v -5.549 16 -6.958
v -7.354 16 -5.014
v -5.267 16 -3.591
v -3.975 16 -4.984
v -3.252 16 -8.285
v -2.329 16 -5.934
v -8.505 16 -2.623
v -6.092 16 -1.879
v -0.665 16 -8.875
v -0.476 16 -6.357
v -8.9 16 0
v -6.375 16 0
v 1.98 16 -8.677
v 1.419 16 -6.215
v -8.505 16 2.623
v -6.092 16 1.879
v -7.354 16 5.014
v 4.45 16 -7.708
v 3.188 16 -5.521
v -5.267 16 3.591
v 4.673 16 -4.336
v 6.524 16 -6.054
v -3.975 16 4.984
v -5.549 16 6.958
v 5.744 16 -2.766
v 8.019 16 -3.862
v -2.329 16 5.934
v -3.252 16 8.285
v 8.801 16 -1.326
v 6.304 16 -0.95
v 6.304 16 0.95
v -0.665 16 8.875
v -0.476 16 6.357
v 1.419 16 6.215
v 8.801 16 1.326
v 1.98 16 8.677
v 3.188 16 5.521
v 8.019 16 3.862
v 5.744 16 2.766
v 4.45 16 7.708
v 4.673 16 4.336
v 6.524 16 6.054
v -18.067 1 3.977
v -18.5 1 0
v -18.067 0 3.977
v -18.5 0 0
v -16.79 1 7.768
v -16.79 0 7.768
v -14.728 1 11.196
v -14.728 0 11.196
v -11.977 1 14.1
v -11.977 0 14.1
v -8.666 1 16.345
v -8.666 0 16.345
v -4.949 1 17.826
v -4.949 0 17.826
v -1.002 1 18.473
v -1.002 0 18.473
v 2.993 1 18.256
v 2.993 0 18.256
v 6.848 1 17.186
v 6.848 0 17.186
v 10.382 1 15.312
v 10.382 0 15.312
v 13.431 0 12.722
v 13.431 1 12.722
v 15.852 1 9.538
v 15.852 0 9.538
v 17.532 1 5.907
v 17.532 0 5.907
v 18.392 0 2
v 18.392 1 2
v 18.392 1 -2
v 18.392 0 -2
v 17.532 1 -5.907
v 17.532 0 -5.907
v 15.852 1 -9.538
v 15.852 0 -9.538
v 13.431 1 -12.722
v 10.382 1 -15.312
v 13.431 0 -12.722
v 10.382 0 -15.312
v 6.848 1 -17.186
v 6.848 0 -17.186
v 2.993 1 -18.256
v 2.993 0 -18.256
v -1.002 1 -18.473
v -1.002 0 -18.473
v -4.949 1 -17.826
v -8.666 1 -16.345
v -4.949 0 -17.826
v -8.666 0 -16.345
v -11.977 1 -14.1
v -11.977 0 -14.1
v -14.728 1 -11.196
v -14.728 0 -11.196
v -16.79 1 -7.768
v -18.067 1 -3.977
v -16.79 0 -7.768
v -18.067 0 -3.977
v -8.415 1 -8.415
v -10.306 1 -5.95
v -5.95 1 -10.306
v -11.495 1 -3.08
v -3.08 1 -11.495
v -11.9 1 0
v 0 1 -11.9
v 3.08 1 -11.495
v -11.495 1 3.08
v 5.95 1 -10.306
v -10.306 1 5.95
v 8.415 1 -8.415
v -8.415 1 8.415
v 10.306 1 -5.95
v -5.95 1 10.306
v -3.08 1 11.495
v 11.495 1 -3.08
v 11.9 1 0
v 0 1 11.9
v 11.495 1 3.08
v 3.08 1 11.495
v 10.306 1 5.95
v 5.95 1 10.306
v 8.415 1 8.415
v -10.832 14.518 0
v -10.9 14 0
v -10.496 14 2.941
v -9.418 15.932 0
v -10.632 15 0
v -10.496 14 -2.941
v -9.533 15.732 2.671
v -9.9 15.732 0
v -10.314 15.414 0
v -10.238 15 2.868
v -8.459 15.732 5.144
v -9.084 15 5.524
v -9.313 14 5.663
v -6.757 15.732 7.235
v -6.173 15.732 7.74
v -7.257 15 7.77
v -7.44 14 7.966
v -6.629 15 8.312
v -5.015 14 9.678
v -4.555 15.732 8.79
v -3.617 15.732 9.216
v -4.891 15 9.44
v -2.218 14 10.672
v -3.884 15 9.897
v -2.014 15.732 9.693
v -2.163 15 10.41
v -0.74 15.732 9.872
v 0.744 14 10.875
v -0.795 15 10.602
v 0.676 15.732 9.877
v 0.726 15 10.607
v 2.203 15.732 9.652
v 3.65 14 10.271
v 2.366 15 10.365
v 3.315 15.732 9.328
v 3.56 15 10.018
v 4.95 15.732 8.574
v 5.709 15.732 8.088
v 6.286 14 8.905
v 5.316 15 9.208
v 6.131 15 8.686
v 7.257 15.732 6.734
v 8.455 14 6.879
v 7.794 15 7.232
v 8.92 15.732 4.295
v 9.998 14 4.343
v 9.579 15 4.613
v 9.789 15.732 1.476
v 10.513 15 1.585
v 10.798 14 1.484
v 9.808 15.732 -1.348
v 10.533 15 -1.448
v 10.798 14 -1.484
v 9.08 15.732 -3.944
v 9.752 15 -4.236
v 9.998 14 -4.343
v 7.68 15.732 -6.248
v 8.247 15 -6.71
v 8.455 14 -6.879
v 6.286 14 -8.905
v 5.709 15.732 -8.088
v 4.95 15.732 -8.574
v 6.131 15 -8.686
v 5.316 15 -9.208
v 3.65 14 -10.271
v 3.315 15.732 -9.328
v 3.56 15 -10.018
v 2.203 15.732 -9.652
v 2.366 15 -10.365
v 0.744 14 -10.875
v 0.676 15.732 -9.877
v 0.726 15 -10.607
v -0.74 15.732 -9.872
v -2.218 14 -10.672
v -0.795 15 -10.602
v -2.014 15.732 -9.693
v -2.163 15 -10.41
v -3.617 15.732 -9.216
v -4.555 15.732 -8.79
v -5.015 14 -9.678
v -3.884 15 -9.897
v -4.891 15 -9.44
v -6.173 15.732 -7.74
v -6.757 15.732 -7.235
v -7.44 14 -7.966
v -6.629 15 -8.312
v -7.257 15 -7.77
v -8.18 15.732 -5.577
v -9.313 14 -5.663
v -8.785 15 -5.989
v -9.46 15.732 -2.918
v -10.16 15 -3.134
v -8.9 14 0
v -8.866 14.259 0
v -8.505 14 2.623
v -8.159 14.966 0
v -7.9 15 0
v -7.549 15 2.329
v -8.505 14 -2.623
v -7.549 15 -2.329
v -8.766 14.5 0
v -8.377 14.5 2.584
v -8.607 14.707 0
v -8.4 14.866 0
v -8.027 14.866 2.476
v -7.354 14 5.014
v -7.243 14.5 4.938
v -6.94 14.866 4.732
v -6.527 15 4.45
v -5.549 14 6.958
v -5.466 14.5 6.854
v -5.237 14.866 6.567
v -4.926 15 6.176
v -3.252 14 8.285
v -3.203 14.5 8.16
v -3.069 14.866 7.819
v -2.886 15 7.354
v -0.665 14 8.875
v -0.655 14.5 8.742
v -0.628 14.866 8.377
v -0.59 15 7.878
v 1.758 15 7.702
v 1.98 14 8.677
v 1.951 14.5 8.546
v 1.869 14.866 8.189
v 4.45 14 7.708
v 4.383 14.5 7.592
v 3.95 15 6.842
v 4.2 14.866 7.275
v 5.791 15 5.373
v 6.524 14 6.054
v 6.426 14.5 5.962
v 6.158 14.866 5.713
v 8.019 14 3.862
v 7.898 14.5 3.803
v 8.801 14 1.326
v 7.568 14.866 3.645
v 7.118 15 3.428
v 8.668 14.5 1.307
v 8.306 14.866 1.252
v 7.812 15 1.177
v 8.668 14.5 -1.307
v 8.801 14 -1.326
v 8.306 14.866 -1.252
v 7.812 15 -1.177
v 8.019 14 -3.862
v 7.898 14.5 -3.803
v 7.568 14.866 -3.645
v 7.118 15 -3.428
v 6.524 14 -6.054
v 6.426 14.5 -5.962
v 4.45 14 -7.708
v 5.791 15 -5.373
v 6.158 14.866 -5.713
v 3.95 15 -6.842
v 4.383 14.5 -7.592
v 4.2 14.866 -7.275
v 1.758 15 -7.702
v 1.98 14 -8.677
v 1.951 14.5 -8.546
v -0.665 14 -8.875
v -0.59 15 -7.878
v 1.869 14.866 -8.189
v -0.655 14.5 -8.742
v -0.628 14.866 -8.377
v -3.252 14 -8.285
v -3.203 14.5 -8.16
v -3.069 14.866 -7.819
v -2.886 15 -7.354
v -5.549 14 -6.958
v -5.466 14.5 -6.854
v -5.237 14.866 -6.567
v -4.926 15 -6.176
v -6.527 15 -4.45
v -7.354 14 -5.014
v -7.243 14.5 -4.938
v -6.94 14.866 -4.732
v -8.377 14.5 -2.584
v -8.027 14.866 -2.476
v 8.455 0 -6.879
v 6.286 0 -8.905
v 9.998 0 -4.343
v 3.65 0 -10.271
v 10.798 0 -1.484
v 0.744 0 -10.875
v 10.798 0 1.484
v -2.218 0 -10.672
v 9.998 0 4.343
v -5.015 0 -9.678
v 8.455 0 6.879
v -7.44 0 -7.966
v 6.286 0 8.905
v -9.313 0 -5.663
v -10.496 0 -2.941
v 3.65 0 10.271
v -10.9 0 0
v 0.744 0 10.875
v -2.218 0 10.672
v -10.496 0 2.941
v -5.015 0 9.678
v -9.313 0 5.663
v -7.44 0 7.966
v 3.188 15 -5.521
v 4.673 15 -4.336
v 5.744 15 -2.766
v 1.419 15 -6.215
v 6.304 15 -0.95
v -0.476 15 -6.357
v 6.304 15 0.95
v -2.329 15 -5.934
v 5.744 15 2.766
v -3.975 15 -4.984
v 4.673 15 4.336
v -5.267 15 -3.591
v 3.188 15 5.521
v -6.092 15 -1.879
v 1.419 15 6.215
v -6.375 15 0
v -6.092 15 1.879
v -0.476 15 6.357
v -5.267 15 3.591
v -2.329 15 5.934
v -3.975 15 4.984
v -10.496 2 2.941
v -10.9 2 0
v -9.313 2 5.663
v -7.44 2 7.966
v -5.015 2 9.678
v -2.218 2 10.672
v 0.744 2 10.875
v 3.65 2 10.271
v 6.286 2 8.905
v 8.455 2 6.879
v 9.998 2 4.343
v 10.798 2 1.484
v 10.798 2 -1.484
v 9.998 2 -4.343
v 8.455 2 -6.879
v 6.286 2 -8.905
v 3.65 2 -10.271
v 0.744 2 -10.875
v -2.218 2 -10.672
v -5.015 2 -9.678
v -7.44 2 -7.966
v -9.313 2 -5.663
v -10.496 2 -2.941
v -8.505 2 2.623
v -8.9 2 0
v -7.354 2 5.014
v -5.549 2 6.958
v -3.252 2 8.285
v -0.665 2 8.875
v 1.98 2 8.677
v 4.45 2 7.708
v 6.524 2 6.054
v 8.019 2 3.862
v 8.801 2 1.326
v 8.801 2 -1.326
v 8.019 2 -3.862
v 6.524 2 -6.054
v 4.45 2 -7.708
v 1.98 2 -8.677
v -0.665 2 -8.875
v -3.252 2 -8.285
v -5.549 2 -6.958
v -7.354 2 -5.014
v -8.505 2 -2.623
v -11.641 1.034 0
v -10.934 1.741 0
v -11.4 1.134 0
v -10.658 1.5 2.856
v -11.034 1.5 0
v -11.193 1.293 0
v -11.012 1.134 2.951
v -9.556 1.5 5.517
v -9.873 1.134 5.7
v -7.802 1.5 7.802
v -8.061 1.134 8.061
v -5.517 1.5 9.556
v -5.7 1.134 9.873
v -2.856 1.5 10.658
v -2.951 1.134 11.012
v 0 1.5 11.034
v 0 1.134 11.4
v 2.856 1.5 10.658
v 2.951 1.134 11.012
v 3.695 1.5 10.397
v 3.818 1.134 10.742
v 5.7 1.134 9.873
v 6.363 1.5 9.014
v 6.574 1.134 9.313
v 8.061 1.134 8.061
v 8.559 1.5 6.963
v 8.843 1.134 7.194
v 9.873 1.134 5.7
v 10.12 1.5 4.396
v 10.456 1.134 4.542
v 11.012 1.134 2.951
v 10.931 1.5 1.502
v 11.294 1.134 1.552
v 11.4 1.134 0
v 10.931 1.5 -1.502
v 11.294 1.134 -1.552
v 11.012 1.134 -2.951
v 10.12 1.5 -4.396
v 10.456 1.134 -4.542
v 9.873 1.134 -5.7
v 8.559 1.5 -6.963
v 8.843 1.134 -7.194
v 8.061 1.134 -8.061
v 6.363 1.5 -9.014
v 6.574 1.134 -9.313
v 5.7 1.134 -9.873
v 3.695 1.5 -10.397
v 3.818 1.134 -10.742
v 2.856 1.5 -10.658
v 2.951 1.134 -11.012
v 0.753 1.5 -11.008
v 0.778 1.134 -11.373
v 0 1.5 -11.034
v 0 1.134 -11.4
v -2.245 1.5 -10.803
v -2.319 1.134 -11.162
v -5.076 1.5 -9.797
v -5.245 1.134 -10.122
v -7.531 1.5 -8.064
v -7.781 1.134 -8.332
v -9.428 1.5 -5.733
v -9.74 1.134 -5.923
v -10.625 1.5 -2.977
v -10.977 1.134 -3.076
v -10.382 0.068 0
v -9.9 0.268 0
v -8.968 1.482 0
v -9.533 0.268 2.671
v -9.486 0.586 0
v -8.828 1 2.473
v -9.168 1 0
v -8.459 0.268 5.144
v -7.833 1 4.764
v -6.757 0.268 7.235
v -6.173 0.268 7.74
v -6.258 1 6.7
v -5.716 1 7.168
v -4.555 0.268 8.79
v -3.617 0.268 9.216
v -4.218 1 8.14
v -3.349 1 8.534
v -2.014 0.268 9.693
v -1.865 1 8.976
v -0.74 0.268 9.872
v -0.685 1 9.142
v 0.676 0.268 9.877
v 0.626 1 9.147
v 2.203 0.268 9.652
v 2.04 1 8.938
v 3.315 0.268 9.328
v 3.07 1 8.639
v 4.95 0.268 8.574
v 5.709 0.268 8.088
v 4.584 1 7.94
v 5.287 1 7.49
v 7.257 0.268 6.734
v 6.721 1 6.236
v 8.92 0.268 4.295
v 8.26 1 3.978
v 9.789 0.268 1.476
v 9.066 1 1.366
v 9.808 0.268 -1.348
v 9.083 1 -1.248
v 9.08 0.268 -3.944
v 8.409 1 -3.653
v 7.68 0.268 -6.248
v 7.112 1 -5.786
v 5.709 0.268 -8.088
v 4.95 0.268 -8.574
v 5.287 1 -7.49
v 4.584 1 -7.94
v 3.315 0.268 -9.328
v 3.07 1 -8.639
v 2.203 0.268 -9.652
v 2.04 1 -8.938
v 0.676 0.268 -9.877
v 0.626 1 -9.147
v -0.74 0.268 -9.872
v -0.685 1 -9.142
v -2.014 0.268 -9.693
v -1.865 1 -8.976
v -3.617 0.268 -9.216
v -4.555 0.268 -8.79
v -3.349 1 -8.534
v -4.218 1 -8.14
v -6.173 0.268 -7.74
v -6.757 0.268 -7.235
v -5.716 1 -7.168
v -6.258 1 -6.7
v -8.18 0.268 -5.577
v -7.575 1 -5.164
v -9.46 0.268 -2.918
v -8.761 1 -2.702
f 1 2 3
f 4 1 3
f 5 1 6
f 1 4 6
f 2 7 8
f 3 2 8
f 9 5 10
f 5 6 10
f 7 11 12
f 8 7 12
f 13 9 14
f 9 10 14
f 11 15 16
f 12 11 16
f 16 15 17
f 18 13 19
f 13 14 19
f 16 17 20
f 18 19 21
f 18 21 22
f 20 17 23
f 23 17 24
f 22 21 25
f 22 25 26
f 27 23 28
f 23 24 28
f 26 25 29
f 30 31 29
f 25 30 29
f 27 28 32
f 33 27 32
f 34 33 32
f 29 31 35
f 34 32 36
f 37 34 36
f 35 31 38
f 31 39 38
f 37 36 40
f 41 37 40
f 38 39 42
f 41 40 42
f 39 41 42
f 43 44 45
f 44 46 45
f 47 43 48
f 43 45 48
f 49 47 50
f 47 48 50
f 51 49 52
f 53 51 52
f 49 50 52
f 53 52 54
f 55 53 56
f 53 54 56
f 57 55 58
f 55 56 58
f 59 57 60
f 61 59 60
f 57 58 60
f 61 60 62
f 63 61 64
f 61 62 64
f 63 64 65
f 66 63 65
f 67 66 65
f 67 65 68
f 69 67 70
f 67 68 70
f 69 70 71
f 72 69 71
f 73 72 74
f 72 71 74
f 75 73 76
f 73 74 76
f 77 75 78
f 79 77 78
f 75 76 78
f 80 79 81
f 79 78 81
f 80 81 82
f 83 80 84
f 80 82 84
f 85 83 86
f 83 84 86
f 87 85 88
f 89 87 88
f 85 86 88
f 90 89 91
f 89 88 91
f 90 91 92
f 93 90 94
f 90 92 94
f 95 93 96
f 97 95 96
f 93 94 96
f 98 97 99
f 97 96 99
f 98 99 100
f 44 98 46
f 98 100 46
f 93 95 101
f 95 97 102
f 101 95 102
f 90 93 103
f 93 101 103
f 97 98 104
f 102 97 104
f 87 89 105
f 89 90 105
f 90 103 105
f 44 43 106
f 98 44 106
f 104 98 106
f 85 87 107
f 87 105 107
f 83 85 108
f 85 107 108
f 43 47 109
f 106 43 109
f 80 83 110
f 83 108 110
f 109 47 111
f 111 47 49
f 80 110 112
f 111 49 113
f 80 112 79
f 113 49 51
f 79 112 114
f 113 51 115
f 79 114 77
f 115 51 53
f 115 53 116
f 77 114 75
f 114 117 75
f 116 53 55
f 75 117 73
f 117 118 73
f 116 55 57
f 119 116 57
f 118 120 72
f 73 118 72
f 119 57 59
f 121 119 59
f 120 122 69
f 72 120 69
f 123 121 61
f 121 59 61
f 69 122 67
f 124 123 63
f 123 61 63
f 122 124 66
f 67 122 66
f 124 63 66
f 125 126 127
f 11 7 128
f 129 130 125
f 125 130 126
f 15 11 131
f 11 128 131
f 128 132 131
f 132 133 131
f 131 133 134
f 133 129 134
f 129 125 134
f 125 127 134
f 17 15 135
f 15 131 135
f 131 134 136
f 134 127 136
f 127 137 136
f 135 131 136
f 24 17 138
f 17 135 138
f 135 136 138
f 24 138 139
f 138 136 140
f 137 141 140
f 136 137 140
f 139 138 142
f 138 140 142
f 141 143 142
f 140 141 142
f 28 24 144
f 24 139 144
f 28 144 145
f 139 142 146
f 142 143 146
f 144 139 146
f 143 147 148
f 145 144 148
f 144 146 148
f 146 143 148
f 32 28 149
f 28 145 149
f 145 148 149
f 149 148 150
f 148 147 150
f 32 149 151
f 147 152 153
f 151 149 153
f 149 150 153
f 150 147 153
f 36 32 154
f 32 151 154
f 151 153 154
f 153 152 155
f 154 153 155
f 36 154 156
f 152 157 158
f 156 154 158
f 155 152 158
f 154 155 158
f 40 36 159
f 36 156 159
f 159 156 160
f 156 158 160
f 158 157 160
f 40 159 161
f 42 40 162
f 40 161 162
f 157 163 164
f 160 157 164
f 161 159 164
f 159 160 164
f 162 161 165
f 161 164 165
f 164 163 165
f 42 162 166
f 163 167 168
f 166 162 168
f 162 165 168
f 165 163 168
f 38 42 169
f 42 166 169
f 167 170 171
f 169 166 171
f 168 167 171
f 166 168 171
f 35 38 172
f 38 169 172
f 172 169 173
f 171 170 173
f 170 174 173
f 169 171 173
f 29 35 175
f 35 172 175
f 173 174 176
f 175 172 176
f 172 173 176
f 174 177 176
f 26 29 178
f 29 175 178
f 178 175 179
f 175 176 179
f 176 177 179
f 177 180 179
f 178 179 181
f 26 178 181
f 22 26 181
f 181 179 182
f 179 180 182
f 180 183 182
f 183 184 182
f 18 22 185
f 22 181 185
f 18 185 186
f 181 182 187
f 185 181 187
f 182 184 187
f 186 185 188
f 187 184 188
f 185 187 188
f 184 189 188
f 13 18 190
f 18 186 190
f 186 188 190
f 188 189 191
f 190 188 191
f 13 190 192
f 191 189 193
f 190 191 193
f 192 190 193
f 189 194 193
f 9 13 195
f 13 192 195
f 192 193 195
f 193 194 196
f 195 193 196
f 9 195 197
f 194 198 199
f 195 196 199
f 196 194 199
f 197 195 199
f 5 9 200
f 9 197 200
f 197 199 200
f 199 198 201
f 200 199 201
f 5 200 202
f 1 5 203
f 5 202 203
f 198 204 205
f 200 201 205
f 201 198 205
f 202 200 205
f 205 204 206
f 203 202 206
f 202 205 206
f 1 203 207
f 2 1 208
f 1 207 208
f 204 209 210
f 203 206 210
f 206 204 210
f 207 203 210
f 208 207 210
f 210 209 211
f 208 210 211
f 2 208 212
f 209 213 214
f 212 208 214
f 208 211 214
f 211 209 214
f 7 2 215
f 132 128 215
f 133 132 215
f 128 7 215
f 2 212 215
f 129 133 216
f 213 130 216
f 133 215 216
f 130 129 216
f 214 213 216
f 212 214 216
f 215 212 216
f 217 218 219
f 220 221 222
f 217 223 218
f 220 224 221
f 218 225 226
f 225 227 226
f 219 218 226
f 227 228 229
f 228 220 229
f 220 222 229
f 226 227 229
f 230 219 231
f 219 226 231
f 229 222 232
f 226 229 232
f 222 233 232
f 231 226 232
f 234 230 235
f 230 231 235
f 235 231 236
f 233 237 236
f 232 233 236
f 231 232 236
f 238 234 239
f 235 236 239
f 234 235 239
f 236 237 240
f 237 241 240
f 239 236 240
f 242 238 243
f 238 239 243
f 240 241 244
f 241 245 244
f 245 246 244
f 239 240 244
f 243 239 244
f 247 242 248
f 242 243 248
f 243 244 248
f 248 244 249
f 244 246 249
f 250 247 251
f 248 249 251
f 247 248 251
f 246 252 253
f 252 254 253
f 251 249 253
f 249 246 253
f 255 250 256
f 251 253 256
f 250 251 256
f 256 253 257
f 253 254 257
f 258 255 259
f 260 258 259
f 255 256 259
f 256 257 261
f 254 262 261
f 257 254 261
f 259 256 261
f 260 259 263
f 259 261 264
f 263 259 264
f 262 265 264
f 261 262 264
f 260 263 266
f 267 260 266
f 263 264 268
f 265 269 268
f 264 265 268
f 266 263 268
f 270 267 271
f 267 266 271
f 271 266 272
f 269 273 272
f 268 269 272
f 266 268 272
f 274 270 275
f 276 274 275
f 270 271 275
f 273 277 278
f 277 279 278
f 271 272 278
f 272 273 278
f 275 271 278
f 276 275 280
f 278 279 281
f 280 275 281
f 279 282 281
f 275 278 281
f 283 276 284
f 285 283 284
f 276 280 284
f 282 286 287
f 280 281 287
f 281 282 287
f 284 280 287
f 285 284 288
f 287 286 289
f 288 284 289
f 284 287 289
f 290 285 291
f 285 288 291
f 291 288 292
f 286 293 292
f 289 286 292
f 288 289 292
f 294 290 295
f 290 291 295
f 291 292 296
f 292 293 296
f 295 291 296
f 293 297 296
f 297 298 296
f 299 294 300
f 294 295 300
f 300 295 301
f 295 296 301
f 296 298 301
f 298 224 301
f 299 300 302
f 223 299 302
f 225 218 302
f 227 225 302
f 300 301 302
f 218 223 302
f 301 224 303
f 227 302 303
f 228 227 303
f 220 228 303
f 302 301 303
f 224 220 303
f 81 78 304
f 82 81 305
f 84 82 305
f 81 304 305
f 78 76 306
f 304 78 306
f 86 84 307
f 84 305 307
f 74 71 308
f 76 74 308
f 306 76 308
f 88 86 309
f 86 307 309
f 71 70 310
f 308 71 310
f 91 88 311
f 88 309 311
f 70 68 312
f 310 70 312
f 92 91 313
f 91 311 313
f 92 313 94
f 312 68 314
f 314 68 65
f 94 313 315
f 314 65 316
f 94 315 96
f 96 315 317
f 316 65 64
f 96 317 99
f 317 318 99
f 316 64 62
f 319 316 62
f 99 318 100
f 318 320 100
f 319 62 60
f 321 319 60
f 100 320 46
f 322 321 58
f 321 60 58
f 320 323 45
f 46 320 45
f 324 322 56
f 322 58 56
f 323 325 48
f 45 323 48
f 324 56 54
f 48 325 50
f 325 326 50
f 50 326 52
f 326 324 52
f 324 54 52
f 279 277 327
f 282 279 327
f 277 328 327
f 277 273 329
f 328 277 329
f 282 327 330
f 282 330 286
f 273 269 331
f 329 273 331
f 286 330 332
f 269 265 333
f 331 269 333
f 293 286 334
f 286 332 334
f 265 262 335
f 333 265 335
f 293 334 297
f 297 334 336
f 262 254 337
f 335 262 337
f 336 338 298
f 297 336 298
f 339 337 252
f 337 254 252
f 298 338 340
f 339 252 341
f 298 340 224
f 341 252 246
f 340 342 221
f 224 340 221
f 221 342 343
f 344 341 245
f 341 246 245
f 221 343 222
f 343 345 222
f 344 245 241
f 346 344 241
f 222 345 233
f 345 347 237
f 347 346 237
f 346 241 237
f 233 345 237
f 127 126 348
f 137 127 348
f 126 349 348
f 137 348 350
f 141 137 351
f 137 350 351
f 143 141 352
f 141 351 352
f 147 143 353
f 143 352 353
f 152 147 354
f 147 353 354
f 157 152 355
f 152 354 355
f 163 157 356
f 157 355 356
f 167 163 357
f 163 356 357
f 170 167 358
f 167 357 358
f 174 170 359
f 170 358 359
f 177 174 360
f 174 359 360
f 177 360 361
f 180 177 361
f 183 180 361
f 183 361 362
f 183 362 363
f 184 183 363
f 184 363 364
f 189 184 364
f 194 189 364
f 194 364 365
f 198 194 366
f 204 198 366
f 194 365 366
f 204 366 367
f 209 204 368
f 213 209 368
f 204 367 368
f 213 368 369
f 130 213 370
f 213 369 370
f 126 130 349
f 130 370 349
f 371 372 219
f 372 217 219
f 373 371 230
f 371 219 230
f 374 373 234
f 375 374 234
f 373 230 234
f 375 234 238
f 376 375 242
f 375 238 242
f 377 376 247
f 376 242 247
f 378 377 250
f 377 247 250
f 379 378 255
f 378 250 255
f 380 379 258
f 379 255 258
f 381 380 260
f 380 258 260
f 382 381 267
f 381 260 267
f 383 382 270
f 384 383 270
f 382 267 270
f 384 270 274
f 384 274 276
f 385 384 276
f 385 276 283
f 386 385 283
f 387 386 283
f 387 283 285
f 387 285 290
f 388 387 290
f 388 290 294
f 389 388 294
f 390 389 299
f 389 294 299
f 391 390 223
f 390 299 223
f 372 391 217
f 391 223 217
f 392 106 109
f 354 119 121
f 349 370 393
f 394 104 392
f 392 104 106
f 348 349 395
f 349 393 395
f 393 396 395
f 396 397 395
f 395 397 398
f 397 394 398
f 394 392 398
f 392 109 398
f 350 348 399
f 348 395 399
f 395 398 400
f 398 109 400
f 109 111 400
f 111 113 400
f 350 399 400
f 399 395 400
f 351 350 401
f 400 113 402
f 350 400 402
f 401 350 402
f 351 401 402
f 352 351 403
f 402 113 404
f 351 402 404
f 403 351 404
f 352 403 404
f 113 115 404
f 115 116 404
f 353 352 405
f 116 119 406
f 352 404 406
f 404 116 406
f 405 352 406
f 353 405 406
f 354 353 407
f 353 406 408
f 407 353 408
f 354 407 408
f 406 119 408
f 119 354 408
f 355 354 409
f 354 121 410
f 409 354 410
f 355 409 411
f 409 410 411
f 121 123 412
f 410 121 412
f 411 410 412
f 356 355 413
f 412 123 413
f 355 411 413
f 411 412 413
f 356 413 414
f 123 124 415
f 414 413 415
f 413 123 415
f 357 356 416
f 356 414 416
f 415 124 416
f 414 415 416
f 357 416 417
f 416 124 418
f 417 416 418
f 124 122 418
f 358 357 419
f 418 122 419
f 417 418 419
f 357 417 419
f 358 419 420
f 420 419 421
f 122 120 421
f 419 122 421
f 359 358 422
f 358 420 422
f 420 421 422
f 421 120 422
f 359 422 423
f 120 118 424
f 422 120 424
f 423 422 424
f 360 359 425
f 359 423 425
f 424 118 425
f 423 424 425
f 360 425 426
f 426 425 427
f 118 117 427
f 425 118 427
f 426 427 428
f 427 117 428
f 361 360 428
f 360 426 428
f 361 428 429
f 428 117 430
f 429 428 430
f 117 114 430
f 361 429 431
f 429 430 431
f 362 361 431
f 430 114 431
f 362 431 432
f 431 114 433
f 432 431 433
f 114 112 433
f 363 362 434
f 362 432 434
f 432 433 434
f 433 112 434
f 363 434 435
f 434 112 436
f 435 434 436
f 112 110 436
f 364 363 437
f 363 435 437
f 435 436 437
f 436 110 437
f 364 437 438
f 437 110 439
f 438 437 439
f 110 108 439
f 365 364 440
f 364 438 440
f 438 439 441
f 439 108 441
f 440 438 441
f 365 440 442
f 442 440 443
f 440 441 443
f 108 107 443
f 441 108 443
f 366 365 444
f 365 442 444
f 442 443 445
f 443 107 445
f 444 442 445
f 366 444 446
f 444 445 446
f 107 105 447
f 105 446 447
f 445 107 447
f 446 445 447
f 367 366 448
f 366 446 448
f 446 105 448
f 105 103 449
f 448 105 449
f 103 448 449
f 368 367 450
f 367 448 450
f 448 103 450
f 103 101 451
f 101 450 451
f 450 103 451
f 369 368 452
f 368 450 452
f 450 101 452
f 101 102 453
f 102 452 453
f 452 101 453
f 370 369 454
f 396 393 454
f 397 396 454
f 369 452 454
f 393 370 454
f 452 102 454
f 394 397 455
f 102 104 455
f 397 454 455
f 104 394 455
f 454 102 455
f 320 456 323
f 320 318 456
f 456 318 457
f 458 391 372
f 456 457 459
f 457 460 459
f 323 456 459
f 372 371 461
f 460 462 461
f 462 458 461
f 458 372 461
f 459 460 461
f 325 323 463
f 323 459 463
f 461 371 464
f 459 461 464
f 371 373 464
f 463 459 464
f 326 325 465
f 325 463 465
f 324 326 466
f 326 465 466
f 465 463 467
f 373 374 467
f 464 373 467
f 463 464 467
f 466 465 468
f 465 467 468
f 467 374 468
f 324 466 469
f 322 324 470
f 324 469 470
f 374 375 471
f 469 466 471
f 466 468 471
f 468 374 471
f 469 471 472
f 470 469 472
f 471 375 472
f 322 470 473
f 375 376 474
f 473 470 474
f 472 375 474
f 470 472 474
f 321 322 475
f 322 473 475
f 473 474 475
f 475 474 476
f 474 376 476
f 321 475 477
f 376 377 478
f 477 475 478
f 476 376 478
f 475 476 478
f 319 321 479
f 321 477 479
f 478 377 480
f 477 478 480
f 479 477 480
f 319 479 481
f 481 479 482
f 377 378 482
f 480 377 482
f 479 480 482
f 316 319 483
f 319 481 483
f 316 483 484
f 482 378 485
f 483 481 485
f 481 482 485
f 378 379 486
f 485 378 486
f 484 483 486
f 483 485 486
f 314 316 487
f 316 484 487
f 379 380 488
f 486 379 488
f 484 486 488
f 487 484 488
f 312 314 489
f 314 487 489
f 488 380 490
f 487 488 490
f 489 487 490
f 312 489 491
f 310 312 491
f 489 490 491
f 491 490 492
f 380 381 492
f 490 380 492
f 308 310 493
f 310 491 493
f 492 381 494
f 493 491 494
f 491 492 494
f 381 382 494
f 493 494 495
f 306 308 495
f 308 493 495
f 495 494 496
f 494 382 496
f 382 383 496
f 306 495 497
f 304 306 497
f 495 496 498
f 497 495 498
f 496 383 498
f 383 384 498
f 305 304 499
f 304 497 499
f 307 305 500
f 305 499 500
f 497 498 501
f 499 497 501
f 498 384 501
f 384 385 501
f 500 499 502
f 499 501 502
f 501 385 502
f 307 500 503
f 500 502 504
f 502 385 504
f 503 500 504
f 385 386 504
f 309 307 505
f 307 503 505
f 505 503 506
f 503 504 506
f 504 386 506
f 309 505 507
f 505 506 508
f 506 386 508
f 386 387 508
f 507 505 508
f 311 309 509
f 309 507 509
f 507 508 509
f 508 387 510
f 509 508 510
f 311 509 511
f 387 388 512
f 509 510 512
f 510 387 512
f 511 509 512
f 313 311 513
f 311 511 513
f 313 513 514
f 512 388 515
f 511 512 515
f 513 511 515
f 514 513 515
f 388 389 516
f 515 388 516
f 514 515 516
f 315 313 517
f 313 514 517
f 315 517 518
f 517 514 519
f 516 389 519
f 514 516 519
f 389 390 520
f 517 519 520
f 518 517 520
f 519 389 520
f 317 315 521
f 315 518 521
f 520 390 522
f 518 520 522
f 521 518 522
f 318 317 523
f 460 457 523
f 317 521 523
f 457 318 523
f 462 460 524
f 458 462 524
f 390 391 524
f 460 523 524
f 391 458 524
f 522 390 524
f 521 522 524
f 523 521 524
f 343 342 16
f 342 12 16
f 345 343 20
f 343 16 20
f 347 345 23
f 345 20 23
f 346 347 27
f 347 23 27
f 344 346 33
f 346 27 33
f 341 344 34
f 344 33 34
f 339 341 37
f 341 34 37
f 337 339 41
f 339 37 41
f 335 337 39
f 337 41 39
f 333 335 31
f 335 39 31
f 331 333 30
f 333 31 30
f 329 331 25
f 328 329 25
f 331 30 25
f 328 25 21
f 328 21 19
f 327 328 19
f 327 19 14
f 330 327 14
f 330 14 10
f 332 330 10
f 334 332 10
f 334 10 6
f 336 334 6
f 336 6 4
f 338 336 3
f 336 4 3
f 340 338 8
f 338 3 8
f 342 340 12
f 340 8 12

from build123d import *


with BuildPart() as part:
    # Sketch1 → Revolve1 (revolve)
    with BuildSketch(Plane.XY):
        with BuildLine():
            Line((-18.5, 0), (-10.9, 0))
            ThreePointArc((-10.9, 0), (-9.485786438, 0.585786438), (-8.9, 2))
            Line((-8.9, 2), (-8.9, 14))
            ThreePointArc((-8.9, 14), (-8.607106781, 14.707106781), (-7.9, 15))
            Line((-7.9, 15), (-6.375, 15))
            Line((-6.375, 15), (-6.375, 16))
            Line((-6.375, 16), (-8.9, 16))
            ThreePointArc((-8.9, 16), (-10.314213562, 15.414213562), (-10.9, 14))
            Line((-10.9, 14), (-10.9, 2))
            ThreePointArc((-10.9, 2), (-11.192893219, 1.292893219), (-11.9, 1))
            Line((-11.9, 1), (-18.5, 1))
            Line((-18.5, 1), (-18.5, 0))
        make_face()
    revolve(axis=Axis((0, 0, 0), (0, 1, 0)))


solid = part.part
